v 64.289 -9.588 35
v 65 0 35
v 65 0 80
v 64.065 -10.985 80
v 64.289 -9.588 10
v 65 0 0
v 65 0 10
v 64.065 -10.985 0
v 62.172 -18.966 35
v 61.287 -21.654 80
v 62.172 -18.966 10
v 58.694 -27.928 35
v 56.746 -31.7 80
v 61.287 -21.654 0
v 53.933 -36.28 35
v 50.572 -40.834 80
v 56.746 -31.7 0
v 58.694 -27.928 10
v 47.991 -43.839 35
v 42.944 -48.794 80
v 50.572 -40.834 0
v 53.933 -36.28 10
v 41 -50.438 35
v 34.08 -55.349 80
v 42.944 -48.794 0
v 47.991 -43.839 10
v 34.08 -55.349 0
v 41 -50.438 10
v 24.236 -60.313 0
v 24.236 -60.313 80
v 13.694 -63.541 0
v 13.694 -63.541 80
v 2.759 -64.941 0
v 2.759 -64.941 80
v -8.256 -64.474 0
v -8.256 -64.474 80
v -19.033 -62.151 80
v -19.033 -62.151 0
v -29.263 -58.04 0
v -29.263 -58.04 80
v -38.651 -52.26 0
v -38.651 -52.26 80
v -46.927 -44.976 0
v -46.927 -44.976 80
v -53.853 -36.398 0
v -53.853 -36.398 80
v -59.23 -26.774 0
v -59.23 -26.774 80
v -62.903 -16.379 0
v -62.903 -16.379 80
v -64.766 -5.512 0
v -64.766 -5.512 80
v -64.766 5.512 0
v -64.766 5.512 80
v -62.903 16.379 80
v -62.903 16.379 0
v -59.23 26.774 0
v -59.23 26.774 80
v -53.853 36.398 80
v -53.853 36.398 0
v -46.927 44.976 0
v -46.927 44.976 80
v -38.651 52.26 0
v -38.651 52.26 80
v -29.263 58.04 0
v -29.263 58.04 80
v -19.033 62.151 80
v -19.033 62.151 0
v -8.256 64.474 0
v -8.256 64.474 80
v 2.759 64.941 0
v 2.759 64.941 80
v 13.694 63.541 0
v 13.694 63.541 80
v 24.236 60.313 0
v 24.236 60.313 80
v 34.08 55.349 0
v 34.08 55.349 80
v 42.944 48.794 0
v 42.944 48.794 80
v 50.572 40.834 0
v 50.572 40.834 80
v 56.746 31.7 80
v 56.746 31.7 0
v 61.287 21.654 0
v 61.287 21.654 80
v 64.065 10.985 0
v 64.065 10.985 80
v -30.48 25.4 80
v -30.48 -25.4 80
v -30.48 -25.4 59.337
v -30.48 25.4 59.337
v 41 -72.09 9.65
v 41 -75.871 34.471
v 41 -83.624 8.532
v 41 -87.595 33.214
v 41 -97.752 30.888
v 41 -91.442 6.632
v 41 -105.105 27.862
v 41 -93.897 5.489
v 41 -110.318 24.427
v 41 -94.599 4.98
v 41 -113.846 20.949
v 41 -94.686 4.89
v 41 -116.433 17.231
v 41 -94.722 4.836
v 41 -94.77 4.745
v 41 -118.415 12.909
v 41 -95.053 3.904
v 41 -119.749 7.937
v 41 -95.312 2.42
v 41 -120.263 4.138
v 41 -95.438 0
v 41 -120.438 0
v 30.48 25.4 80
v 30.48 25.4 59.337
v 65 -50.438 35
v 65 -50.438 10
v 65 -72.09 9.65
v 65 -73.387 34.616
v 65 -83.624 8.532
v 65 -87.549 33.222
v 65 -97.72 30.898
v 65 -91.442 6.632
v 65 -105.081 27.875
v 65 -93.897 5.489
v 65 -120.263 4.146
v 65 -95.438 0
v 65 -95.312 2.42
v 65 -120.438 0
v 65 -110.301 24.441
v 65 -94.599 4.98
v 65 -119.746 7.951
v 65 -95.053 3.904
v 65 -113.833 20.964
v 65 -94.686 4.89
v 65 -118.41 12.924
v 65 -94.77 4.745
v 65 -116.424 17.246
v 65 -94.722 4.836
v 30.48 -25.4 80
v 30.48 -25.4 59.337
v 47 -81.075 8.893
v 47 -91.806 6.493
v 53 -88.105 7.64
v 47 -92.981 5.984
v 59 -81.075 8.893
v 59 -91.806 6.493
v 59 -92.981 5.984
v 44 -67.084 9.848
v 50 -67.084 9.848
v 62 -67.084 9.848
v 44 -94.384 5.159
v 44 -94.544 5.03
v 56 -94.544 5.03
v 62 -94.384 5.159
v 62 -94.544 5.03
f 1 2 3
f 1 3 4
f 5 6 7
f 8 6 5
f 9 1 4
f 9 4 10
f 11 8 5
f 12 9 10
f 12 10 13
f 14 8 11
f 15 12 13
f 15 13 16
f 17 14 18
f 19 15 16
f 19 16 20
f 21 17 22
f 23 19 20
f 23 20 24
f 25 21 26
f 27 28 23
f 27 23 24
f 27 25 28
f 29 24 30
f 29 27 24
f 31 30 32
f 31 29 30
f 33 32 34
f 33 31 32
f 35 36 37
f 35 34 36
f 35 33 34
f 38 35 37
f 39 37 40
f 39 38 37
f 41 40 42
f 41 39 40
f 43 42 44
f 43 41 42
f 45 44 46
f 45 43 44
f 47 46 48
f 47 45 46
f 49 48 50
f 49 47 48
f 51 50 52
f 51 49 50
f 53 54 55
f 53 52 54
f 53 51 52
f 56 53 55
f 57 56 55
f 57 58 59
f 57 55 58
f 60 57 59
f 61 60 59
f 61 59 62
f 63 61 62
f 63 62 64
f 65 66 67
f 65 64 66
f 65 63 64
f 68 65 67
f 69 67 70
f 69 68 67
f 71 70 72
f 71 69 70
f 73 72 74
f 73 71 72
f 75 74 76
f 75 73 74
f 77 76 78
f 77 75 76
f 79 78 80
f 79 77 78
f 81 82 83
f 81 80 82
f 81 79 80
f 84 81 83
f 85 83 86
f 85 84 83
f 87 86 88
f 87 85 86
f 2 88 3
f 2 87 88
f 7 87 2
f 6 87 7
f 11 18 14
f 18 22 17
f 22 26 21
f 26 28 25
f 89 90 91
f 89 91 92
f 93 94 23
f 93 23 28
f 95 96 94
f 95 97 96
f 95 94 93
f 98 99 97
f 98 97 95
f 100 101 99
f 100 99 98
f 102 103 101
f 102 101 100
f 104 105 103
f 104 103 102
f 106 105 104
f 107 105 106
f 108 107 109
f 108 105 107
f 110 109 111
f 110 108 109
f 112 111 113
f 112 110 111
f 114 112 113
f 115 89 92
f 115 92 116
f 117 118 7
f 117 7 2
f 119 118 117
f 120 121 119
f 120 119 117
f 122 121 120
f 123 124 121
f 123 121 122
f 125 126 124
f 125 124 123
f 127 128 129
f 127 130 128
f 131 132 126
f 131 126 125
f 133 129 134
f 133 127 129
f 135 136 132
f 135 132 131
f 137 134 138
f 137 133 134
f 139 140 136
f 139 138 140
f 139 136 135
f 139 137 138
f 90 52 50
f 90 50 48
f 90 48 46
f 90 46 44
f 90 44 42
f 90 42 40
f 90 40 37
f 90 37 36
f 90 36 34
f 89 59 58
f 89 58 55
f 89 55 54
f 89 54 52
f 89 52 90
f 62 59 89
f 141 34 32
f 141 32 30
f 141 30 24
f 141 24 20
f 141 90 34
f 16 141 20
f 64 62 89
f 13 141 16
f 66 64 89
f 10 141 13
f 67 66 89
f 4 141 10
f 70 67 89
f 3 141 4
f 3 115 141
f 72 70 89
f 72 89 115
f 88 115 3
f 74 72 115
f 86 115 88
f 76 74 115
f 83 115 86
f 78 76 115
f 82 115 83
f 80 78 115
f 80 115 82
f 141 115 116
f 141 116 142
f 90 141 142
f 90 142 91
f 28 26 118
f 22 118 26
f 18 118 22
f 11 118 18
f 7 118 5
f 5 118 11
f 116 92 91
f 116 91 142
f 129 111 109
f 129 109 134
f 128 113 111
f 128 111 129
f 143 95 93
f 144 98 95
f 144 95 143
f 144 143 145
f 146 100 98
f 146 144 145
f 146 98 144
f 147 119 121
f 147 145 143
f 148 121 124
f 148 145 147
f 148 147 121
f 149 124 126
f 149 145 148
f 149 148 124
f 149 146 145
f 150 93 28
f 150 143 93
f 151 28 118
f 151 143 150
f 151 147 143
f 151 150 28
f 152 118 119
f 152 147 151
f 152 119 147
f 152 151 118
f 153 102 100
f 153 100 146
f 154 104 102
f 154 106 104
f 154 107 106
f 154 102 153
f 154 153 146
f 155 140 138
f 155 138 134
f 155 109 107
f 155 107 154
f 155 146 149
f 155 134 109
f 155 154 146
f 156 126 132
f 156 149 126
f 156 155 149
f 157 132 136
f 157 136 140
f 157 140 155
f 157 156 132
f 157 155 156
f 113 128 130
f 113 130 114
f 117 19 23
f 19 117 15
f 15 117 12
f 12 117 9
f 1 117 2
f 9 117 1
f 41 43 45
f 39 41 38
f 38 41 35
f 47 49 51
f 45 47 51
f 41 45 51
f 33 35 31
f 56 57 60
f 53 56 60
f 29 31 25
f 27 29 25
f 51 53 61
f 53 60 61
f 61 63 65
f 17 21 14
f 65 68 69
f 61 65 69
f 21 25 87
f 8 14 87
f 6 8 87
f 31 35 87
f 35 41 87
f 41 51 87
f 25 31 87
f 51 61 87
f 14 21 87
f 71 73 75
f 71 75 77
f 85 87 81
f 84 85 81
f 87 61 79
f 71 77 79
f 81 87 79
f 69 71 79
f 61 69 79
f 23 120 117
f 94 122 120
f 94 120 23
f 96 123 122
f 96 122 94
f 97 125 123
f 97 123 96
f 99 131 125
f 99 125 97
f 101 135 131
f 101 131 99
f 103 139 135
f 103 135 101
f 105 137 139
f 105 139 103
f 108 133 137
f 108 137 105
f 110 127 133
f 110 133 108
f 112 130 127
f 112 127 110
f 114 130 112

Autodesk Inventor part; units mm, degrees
ref_plane "XZ Plane" through (0, 0, 0) normal (0, 1, 0) x (-1, 0, 0)
sketch "Sketch1" plane through (0, 0, 0) normal (0, 0, 1) x (1, 0, 0)
  circle A0 centre (0, 0) radius 65
  dimension "d0" = 130
extrude "Extrusion1" add sketch "Sketch1" along normal blind 80
ref_plane "Work Plane1" through (0, 0, 35) normal (0, 0, -1) x (-1, 0, 0)
ref_plane "Work Plane2" through (65, 0, 0) normal (1, 0, 0) x (0, 1, 0)
sketch "Sketch2" plane through (0, 0, 35) normal (0, 0, -1) x (-1, 0, 0)
  circle A0 centre (0, 0) radius 65 projected
  line L0 (0, 0) -> (-65, 0) construction
  circle A1 centre (0, 0) radius 65 projected
  line L1 (-65, 0) -> (-41, 0)
  line L2 (-41, 0) -> (-41, -50.4381)
  line L3 (-41, -50.4381) -> (-65, -50.4381)
  line L4 (-65, -50.4381) -> (-65, 0)
  dimension "d4" = 24
extrude "Extrusion2" add sketch "Sketch2" along normal blind 25 contours A0 L3 L4
sketch "Sketch3" plane through (65, 0, 0) normal (1, 0, 0) x (0, 1, 0)
  line L0 (0, 35) -> (-50.4381, 35) projected
  line L1 (-50.4381, 35) -> (-50.4381, 10) projected
  line L2 (0, 10) -> (-50.4381, 10) construction
  line L3 (0, 10) -> (0, 35) construction
  line L4 (0, 35) -> (-50.4381, 35) projected
  line L5 (-50.4381, 35) -> (-85.4381, 35) construction
  line L6 (-85.4381, 35) -> (-120.4381, 35) construction
  line L7 (-120.4381, 35) -> (-120.4381, 0) construction
  spline S0 degree 3 poles (-50.4381, 35) (-85.4381, 35) (-120.4381, 35) (-120.4381, 0) knots 1 1 1 1 2 2 2 2
  line L8 (0, 0) -> (-133.4667, 0) construction
  line L9 (-120.4381, 0) -> (-120.4381, 80.5106) construction
  line L10 (-50.4381, 35) -> (-166.769, 35) construction
  line L11 (111.3538, 35) -> (-213.1228, 35) construction
  dimension "d7" = 70
  dimension "d8" = 35
  dimension "d9" = 35
sketch "Sketch4" plane through (41, -50.4381, 35) normal (0, -1, 0) x (1, 0, 0)
  line L0 (24, 0) -> (0, 0) projected
  line L1 (0, -25) -> (0, 0) projected
  line L2 (24, -25) -> (0, -25) projected
  line L3 (24, 0) -> (24, -25) projected
  point P0 (-41, -35)
sweep "Sweep1" add profiles "Sketch4" path "Sketch3" path curves S0
sketch "Sketch5" plane through (0, 0, 80) normal (0, 0, 1) x (1, 0, 0)
  circle A0 centre (0, 0) radius 65 projected
  line L0 (-30.48, 25.4) -> (30.48, 25.4)
  line L1 (30.48, 25.4) -> (30.48, -25.4)
  line L2 (30.48, -25.4) -> (-30.48, -25.4)
  line L3 (-30.48, -25.4) -> (-30.48, 25.4)
  line L4 (-30.48, 25.4) -> (30.48, -25.4) construction
  line L5 (30.48, 25.4) -> (-30.48, -25.4) construction
  dimension "d12" = 60.96
  dimension "d13" = 50.8
extrude "Extrusion3" cut sketch "Sketch5" against normal blind 20.663 contours L0 L1 L2 L3
properties part number "Dust Bin CFD"
